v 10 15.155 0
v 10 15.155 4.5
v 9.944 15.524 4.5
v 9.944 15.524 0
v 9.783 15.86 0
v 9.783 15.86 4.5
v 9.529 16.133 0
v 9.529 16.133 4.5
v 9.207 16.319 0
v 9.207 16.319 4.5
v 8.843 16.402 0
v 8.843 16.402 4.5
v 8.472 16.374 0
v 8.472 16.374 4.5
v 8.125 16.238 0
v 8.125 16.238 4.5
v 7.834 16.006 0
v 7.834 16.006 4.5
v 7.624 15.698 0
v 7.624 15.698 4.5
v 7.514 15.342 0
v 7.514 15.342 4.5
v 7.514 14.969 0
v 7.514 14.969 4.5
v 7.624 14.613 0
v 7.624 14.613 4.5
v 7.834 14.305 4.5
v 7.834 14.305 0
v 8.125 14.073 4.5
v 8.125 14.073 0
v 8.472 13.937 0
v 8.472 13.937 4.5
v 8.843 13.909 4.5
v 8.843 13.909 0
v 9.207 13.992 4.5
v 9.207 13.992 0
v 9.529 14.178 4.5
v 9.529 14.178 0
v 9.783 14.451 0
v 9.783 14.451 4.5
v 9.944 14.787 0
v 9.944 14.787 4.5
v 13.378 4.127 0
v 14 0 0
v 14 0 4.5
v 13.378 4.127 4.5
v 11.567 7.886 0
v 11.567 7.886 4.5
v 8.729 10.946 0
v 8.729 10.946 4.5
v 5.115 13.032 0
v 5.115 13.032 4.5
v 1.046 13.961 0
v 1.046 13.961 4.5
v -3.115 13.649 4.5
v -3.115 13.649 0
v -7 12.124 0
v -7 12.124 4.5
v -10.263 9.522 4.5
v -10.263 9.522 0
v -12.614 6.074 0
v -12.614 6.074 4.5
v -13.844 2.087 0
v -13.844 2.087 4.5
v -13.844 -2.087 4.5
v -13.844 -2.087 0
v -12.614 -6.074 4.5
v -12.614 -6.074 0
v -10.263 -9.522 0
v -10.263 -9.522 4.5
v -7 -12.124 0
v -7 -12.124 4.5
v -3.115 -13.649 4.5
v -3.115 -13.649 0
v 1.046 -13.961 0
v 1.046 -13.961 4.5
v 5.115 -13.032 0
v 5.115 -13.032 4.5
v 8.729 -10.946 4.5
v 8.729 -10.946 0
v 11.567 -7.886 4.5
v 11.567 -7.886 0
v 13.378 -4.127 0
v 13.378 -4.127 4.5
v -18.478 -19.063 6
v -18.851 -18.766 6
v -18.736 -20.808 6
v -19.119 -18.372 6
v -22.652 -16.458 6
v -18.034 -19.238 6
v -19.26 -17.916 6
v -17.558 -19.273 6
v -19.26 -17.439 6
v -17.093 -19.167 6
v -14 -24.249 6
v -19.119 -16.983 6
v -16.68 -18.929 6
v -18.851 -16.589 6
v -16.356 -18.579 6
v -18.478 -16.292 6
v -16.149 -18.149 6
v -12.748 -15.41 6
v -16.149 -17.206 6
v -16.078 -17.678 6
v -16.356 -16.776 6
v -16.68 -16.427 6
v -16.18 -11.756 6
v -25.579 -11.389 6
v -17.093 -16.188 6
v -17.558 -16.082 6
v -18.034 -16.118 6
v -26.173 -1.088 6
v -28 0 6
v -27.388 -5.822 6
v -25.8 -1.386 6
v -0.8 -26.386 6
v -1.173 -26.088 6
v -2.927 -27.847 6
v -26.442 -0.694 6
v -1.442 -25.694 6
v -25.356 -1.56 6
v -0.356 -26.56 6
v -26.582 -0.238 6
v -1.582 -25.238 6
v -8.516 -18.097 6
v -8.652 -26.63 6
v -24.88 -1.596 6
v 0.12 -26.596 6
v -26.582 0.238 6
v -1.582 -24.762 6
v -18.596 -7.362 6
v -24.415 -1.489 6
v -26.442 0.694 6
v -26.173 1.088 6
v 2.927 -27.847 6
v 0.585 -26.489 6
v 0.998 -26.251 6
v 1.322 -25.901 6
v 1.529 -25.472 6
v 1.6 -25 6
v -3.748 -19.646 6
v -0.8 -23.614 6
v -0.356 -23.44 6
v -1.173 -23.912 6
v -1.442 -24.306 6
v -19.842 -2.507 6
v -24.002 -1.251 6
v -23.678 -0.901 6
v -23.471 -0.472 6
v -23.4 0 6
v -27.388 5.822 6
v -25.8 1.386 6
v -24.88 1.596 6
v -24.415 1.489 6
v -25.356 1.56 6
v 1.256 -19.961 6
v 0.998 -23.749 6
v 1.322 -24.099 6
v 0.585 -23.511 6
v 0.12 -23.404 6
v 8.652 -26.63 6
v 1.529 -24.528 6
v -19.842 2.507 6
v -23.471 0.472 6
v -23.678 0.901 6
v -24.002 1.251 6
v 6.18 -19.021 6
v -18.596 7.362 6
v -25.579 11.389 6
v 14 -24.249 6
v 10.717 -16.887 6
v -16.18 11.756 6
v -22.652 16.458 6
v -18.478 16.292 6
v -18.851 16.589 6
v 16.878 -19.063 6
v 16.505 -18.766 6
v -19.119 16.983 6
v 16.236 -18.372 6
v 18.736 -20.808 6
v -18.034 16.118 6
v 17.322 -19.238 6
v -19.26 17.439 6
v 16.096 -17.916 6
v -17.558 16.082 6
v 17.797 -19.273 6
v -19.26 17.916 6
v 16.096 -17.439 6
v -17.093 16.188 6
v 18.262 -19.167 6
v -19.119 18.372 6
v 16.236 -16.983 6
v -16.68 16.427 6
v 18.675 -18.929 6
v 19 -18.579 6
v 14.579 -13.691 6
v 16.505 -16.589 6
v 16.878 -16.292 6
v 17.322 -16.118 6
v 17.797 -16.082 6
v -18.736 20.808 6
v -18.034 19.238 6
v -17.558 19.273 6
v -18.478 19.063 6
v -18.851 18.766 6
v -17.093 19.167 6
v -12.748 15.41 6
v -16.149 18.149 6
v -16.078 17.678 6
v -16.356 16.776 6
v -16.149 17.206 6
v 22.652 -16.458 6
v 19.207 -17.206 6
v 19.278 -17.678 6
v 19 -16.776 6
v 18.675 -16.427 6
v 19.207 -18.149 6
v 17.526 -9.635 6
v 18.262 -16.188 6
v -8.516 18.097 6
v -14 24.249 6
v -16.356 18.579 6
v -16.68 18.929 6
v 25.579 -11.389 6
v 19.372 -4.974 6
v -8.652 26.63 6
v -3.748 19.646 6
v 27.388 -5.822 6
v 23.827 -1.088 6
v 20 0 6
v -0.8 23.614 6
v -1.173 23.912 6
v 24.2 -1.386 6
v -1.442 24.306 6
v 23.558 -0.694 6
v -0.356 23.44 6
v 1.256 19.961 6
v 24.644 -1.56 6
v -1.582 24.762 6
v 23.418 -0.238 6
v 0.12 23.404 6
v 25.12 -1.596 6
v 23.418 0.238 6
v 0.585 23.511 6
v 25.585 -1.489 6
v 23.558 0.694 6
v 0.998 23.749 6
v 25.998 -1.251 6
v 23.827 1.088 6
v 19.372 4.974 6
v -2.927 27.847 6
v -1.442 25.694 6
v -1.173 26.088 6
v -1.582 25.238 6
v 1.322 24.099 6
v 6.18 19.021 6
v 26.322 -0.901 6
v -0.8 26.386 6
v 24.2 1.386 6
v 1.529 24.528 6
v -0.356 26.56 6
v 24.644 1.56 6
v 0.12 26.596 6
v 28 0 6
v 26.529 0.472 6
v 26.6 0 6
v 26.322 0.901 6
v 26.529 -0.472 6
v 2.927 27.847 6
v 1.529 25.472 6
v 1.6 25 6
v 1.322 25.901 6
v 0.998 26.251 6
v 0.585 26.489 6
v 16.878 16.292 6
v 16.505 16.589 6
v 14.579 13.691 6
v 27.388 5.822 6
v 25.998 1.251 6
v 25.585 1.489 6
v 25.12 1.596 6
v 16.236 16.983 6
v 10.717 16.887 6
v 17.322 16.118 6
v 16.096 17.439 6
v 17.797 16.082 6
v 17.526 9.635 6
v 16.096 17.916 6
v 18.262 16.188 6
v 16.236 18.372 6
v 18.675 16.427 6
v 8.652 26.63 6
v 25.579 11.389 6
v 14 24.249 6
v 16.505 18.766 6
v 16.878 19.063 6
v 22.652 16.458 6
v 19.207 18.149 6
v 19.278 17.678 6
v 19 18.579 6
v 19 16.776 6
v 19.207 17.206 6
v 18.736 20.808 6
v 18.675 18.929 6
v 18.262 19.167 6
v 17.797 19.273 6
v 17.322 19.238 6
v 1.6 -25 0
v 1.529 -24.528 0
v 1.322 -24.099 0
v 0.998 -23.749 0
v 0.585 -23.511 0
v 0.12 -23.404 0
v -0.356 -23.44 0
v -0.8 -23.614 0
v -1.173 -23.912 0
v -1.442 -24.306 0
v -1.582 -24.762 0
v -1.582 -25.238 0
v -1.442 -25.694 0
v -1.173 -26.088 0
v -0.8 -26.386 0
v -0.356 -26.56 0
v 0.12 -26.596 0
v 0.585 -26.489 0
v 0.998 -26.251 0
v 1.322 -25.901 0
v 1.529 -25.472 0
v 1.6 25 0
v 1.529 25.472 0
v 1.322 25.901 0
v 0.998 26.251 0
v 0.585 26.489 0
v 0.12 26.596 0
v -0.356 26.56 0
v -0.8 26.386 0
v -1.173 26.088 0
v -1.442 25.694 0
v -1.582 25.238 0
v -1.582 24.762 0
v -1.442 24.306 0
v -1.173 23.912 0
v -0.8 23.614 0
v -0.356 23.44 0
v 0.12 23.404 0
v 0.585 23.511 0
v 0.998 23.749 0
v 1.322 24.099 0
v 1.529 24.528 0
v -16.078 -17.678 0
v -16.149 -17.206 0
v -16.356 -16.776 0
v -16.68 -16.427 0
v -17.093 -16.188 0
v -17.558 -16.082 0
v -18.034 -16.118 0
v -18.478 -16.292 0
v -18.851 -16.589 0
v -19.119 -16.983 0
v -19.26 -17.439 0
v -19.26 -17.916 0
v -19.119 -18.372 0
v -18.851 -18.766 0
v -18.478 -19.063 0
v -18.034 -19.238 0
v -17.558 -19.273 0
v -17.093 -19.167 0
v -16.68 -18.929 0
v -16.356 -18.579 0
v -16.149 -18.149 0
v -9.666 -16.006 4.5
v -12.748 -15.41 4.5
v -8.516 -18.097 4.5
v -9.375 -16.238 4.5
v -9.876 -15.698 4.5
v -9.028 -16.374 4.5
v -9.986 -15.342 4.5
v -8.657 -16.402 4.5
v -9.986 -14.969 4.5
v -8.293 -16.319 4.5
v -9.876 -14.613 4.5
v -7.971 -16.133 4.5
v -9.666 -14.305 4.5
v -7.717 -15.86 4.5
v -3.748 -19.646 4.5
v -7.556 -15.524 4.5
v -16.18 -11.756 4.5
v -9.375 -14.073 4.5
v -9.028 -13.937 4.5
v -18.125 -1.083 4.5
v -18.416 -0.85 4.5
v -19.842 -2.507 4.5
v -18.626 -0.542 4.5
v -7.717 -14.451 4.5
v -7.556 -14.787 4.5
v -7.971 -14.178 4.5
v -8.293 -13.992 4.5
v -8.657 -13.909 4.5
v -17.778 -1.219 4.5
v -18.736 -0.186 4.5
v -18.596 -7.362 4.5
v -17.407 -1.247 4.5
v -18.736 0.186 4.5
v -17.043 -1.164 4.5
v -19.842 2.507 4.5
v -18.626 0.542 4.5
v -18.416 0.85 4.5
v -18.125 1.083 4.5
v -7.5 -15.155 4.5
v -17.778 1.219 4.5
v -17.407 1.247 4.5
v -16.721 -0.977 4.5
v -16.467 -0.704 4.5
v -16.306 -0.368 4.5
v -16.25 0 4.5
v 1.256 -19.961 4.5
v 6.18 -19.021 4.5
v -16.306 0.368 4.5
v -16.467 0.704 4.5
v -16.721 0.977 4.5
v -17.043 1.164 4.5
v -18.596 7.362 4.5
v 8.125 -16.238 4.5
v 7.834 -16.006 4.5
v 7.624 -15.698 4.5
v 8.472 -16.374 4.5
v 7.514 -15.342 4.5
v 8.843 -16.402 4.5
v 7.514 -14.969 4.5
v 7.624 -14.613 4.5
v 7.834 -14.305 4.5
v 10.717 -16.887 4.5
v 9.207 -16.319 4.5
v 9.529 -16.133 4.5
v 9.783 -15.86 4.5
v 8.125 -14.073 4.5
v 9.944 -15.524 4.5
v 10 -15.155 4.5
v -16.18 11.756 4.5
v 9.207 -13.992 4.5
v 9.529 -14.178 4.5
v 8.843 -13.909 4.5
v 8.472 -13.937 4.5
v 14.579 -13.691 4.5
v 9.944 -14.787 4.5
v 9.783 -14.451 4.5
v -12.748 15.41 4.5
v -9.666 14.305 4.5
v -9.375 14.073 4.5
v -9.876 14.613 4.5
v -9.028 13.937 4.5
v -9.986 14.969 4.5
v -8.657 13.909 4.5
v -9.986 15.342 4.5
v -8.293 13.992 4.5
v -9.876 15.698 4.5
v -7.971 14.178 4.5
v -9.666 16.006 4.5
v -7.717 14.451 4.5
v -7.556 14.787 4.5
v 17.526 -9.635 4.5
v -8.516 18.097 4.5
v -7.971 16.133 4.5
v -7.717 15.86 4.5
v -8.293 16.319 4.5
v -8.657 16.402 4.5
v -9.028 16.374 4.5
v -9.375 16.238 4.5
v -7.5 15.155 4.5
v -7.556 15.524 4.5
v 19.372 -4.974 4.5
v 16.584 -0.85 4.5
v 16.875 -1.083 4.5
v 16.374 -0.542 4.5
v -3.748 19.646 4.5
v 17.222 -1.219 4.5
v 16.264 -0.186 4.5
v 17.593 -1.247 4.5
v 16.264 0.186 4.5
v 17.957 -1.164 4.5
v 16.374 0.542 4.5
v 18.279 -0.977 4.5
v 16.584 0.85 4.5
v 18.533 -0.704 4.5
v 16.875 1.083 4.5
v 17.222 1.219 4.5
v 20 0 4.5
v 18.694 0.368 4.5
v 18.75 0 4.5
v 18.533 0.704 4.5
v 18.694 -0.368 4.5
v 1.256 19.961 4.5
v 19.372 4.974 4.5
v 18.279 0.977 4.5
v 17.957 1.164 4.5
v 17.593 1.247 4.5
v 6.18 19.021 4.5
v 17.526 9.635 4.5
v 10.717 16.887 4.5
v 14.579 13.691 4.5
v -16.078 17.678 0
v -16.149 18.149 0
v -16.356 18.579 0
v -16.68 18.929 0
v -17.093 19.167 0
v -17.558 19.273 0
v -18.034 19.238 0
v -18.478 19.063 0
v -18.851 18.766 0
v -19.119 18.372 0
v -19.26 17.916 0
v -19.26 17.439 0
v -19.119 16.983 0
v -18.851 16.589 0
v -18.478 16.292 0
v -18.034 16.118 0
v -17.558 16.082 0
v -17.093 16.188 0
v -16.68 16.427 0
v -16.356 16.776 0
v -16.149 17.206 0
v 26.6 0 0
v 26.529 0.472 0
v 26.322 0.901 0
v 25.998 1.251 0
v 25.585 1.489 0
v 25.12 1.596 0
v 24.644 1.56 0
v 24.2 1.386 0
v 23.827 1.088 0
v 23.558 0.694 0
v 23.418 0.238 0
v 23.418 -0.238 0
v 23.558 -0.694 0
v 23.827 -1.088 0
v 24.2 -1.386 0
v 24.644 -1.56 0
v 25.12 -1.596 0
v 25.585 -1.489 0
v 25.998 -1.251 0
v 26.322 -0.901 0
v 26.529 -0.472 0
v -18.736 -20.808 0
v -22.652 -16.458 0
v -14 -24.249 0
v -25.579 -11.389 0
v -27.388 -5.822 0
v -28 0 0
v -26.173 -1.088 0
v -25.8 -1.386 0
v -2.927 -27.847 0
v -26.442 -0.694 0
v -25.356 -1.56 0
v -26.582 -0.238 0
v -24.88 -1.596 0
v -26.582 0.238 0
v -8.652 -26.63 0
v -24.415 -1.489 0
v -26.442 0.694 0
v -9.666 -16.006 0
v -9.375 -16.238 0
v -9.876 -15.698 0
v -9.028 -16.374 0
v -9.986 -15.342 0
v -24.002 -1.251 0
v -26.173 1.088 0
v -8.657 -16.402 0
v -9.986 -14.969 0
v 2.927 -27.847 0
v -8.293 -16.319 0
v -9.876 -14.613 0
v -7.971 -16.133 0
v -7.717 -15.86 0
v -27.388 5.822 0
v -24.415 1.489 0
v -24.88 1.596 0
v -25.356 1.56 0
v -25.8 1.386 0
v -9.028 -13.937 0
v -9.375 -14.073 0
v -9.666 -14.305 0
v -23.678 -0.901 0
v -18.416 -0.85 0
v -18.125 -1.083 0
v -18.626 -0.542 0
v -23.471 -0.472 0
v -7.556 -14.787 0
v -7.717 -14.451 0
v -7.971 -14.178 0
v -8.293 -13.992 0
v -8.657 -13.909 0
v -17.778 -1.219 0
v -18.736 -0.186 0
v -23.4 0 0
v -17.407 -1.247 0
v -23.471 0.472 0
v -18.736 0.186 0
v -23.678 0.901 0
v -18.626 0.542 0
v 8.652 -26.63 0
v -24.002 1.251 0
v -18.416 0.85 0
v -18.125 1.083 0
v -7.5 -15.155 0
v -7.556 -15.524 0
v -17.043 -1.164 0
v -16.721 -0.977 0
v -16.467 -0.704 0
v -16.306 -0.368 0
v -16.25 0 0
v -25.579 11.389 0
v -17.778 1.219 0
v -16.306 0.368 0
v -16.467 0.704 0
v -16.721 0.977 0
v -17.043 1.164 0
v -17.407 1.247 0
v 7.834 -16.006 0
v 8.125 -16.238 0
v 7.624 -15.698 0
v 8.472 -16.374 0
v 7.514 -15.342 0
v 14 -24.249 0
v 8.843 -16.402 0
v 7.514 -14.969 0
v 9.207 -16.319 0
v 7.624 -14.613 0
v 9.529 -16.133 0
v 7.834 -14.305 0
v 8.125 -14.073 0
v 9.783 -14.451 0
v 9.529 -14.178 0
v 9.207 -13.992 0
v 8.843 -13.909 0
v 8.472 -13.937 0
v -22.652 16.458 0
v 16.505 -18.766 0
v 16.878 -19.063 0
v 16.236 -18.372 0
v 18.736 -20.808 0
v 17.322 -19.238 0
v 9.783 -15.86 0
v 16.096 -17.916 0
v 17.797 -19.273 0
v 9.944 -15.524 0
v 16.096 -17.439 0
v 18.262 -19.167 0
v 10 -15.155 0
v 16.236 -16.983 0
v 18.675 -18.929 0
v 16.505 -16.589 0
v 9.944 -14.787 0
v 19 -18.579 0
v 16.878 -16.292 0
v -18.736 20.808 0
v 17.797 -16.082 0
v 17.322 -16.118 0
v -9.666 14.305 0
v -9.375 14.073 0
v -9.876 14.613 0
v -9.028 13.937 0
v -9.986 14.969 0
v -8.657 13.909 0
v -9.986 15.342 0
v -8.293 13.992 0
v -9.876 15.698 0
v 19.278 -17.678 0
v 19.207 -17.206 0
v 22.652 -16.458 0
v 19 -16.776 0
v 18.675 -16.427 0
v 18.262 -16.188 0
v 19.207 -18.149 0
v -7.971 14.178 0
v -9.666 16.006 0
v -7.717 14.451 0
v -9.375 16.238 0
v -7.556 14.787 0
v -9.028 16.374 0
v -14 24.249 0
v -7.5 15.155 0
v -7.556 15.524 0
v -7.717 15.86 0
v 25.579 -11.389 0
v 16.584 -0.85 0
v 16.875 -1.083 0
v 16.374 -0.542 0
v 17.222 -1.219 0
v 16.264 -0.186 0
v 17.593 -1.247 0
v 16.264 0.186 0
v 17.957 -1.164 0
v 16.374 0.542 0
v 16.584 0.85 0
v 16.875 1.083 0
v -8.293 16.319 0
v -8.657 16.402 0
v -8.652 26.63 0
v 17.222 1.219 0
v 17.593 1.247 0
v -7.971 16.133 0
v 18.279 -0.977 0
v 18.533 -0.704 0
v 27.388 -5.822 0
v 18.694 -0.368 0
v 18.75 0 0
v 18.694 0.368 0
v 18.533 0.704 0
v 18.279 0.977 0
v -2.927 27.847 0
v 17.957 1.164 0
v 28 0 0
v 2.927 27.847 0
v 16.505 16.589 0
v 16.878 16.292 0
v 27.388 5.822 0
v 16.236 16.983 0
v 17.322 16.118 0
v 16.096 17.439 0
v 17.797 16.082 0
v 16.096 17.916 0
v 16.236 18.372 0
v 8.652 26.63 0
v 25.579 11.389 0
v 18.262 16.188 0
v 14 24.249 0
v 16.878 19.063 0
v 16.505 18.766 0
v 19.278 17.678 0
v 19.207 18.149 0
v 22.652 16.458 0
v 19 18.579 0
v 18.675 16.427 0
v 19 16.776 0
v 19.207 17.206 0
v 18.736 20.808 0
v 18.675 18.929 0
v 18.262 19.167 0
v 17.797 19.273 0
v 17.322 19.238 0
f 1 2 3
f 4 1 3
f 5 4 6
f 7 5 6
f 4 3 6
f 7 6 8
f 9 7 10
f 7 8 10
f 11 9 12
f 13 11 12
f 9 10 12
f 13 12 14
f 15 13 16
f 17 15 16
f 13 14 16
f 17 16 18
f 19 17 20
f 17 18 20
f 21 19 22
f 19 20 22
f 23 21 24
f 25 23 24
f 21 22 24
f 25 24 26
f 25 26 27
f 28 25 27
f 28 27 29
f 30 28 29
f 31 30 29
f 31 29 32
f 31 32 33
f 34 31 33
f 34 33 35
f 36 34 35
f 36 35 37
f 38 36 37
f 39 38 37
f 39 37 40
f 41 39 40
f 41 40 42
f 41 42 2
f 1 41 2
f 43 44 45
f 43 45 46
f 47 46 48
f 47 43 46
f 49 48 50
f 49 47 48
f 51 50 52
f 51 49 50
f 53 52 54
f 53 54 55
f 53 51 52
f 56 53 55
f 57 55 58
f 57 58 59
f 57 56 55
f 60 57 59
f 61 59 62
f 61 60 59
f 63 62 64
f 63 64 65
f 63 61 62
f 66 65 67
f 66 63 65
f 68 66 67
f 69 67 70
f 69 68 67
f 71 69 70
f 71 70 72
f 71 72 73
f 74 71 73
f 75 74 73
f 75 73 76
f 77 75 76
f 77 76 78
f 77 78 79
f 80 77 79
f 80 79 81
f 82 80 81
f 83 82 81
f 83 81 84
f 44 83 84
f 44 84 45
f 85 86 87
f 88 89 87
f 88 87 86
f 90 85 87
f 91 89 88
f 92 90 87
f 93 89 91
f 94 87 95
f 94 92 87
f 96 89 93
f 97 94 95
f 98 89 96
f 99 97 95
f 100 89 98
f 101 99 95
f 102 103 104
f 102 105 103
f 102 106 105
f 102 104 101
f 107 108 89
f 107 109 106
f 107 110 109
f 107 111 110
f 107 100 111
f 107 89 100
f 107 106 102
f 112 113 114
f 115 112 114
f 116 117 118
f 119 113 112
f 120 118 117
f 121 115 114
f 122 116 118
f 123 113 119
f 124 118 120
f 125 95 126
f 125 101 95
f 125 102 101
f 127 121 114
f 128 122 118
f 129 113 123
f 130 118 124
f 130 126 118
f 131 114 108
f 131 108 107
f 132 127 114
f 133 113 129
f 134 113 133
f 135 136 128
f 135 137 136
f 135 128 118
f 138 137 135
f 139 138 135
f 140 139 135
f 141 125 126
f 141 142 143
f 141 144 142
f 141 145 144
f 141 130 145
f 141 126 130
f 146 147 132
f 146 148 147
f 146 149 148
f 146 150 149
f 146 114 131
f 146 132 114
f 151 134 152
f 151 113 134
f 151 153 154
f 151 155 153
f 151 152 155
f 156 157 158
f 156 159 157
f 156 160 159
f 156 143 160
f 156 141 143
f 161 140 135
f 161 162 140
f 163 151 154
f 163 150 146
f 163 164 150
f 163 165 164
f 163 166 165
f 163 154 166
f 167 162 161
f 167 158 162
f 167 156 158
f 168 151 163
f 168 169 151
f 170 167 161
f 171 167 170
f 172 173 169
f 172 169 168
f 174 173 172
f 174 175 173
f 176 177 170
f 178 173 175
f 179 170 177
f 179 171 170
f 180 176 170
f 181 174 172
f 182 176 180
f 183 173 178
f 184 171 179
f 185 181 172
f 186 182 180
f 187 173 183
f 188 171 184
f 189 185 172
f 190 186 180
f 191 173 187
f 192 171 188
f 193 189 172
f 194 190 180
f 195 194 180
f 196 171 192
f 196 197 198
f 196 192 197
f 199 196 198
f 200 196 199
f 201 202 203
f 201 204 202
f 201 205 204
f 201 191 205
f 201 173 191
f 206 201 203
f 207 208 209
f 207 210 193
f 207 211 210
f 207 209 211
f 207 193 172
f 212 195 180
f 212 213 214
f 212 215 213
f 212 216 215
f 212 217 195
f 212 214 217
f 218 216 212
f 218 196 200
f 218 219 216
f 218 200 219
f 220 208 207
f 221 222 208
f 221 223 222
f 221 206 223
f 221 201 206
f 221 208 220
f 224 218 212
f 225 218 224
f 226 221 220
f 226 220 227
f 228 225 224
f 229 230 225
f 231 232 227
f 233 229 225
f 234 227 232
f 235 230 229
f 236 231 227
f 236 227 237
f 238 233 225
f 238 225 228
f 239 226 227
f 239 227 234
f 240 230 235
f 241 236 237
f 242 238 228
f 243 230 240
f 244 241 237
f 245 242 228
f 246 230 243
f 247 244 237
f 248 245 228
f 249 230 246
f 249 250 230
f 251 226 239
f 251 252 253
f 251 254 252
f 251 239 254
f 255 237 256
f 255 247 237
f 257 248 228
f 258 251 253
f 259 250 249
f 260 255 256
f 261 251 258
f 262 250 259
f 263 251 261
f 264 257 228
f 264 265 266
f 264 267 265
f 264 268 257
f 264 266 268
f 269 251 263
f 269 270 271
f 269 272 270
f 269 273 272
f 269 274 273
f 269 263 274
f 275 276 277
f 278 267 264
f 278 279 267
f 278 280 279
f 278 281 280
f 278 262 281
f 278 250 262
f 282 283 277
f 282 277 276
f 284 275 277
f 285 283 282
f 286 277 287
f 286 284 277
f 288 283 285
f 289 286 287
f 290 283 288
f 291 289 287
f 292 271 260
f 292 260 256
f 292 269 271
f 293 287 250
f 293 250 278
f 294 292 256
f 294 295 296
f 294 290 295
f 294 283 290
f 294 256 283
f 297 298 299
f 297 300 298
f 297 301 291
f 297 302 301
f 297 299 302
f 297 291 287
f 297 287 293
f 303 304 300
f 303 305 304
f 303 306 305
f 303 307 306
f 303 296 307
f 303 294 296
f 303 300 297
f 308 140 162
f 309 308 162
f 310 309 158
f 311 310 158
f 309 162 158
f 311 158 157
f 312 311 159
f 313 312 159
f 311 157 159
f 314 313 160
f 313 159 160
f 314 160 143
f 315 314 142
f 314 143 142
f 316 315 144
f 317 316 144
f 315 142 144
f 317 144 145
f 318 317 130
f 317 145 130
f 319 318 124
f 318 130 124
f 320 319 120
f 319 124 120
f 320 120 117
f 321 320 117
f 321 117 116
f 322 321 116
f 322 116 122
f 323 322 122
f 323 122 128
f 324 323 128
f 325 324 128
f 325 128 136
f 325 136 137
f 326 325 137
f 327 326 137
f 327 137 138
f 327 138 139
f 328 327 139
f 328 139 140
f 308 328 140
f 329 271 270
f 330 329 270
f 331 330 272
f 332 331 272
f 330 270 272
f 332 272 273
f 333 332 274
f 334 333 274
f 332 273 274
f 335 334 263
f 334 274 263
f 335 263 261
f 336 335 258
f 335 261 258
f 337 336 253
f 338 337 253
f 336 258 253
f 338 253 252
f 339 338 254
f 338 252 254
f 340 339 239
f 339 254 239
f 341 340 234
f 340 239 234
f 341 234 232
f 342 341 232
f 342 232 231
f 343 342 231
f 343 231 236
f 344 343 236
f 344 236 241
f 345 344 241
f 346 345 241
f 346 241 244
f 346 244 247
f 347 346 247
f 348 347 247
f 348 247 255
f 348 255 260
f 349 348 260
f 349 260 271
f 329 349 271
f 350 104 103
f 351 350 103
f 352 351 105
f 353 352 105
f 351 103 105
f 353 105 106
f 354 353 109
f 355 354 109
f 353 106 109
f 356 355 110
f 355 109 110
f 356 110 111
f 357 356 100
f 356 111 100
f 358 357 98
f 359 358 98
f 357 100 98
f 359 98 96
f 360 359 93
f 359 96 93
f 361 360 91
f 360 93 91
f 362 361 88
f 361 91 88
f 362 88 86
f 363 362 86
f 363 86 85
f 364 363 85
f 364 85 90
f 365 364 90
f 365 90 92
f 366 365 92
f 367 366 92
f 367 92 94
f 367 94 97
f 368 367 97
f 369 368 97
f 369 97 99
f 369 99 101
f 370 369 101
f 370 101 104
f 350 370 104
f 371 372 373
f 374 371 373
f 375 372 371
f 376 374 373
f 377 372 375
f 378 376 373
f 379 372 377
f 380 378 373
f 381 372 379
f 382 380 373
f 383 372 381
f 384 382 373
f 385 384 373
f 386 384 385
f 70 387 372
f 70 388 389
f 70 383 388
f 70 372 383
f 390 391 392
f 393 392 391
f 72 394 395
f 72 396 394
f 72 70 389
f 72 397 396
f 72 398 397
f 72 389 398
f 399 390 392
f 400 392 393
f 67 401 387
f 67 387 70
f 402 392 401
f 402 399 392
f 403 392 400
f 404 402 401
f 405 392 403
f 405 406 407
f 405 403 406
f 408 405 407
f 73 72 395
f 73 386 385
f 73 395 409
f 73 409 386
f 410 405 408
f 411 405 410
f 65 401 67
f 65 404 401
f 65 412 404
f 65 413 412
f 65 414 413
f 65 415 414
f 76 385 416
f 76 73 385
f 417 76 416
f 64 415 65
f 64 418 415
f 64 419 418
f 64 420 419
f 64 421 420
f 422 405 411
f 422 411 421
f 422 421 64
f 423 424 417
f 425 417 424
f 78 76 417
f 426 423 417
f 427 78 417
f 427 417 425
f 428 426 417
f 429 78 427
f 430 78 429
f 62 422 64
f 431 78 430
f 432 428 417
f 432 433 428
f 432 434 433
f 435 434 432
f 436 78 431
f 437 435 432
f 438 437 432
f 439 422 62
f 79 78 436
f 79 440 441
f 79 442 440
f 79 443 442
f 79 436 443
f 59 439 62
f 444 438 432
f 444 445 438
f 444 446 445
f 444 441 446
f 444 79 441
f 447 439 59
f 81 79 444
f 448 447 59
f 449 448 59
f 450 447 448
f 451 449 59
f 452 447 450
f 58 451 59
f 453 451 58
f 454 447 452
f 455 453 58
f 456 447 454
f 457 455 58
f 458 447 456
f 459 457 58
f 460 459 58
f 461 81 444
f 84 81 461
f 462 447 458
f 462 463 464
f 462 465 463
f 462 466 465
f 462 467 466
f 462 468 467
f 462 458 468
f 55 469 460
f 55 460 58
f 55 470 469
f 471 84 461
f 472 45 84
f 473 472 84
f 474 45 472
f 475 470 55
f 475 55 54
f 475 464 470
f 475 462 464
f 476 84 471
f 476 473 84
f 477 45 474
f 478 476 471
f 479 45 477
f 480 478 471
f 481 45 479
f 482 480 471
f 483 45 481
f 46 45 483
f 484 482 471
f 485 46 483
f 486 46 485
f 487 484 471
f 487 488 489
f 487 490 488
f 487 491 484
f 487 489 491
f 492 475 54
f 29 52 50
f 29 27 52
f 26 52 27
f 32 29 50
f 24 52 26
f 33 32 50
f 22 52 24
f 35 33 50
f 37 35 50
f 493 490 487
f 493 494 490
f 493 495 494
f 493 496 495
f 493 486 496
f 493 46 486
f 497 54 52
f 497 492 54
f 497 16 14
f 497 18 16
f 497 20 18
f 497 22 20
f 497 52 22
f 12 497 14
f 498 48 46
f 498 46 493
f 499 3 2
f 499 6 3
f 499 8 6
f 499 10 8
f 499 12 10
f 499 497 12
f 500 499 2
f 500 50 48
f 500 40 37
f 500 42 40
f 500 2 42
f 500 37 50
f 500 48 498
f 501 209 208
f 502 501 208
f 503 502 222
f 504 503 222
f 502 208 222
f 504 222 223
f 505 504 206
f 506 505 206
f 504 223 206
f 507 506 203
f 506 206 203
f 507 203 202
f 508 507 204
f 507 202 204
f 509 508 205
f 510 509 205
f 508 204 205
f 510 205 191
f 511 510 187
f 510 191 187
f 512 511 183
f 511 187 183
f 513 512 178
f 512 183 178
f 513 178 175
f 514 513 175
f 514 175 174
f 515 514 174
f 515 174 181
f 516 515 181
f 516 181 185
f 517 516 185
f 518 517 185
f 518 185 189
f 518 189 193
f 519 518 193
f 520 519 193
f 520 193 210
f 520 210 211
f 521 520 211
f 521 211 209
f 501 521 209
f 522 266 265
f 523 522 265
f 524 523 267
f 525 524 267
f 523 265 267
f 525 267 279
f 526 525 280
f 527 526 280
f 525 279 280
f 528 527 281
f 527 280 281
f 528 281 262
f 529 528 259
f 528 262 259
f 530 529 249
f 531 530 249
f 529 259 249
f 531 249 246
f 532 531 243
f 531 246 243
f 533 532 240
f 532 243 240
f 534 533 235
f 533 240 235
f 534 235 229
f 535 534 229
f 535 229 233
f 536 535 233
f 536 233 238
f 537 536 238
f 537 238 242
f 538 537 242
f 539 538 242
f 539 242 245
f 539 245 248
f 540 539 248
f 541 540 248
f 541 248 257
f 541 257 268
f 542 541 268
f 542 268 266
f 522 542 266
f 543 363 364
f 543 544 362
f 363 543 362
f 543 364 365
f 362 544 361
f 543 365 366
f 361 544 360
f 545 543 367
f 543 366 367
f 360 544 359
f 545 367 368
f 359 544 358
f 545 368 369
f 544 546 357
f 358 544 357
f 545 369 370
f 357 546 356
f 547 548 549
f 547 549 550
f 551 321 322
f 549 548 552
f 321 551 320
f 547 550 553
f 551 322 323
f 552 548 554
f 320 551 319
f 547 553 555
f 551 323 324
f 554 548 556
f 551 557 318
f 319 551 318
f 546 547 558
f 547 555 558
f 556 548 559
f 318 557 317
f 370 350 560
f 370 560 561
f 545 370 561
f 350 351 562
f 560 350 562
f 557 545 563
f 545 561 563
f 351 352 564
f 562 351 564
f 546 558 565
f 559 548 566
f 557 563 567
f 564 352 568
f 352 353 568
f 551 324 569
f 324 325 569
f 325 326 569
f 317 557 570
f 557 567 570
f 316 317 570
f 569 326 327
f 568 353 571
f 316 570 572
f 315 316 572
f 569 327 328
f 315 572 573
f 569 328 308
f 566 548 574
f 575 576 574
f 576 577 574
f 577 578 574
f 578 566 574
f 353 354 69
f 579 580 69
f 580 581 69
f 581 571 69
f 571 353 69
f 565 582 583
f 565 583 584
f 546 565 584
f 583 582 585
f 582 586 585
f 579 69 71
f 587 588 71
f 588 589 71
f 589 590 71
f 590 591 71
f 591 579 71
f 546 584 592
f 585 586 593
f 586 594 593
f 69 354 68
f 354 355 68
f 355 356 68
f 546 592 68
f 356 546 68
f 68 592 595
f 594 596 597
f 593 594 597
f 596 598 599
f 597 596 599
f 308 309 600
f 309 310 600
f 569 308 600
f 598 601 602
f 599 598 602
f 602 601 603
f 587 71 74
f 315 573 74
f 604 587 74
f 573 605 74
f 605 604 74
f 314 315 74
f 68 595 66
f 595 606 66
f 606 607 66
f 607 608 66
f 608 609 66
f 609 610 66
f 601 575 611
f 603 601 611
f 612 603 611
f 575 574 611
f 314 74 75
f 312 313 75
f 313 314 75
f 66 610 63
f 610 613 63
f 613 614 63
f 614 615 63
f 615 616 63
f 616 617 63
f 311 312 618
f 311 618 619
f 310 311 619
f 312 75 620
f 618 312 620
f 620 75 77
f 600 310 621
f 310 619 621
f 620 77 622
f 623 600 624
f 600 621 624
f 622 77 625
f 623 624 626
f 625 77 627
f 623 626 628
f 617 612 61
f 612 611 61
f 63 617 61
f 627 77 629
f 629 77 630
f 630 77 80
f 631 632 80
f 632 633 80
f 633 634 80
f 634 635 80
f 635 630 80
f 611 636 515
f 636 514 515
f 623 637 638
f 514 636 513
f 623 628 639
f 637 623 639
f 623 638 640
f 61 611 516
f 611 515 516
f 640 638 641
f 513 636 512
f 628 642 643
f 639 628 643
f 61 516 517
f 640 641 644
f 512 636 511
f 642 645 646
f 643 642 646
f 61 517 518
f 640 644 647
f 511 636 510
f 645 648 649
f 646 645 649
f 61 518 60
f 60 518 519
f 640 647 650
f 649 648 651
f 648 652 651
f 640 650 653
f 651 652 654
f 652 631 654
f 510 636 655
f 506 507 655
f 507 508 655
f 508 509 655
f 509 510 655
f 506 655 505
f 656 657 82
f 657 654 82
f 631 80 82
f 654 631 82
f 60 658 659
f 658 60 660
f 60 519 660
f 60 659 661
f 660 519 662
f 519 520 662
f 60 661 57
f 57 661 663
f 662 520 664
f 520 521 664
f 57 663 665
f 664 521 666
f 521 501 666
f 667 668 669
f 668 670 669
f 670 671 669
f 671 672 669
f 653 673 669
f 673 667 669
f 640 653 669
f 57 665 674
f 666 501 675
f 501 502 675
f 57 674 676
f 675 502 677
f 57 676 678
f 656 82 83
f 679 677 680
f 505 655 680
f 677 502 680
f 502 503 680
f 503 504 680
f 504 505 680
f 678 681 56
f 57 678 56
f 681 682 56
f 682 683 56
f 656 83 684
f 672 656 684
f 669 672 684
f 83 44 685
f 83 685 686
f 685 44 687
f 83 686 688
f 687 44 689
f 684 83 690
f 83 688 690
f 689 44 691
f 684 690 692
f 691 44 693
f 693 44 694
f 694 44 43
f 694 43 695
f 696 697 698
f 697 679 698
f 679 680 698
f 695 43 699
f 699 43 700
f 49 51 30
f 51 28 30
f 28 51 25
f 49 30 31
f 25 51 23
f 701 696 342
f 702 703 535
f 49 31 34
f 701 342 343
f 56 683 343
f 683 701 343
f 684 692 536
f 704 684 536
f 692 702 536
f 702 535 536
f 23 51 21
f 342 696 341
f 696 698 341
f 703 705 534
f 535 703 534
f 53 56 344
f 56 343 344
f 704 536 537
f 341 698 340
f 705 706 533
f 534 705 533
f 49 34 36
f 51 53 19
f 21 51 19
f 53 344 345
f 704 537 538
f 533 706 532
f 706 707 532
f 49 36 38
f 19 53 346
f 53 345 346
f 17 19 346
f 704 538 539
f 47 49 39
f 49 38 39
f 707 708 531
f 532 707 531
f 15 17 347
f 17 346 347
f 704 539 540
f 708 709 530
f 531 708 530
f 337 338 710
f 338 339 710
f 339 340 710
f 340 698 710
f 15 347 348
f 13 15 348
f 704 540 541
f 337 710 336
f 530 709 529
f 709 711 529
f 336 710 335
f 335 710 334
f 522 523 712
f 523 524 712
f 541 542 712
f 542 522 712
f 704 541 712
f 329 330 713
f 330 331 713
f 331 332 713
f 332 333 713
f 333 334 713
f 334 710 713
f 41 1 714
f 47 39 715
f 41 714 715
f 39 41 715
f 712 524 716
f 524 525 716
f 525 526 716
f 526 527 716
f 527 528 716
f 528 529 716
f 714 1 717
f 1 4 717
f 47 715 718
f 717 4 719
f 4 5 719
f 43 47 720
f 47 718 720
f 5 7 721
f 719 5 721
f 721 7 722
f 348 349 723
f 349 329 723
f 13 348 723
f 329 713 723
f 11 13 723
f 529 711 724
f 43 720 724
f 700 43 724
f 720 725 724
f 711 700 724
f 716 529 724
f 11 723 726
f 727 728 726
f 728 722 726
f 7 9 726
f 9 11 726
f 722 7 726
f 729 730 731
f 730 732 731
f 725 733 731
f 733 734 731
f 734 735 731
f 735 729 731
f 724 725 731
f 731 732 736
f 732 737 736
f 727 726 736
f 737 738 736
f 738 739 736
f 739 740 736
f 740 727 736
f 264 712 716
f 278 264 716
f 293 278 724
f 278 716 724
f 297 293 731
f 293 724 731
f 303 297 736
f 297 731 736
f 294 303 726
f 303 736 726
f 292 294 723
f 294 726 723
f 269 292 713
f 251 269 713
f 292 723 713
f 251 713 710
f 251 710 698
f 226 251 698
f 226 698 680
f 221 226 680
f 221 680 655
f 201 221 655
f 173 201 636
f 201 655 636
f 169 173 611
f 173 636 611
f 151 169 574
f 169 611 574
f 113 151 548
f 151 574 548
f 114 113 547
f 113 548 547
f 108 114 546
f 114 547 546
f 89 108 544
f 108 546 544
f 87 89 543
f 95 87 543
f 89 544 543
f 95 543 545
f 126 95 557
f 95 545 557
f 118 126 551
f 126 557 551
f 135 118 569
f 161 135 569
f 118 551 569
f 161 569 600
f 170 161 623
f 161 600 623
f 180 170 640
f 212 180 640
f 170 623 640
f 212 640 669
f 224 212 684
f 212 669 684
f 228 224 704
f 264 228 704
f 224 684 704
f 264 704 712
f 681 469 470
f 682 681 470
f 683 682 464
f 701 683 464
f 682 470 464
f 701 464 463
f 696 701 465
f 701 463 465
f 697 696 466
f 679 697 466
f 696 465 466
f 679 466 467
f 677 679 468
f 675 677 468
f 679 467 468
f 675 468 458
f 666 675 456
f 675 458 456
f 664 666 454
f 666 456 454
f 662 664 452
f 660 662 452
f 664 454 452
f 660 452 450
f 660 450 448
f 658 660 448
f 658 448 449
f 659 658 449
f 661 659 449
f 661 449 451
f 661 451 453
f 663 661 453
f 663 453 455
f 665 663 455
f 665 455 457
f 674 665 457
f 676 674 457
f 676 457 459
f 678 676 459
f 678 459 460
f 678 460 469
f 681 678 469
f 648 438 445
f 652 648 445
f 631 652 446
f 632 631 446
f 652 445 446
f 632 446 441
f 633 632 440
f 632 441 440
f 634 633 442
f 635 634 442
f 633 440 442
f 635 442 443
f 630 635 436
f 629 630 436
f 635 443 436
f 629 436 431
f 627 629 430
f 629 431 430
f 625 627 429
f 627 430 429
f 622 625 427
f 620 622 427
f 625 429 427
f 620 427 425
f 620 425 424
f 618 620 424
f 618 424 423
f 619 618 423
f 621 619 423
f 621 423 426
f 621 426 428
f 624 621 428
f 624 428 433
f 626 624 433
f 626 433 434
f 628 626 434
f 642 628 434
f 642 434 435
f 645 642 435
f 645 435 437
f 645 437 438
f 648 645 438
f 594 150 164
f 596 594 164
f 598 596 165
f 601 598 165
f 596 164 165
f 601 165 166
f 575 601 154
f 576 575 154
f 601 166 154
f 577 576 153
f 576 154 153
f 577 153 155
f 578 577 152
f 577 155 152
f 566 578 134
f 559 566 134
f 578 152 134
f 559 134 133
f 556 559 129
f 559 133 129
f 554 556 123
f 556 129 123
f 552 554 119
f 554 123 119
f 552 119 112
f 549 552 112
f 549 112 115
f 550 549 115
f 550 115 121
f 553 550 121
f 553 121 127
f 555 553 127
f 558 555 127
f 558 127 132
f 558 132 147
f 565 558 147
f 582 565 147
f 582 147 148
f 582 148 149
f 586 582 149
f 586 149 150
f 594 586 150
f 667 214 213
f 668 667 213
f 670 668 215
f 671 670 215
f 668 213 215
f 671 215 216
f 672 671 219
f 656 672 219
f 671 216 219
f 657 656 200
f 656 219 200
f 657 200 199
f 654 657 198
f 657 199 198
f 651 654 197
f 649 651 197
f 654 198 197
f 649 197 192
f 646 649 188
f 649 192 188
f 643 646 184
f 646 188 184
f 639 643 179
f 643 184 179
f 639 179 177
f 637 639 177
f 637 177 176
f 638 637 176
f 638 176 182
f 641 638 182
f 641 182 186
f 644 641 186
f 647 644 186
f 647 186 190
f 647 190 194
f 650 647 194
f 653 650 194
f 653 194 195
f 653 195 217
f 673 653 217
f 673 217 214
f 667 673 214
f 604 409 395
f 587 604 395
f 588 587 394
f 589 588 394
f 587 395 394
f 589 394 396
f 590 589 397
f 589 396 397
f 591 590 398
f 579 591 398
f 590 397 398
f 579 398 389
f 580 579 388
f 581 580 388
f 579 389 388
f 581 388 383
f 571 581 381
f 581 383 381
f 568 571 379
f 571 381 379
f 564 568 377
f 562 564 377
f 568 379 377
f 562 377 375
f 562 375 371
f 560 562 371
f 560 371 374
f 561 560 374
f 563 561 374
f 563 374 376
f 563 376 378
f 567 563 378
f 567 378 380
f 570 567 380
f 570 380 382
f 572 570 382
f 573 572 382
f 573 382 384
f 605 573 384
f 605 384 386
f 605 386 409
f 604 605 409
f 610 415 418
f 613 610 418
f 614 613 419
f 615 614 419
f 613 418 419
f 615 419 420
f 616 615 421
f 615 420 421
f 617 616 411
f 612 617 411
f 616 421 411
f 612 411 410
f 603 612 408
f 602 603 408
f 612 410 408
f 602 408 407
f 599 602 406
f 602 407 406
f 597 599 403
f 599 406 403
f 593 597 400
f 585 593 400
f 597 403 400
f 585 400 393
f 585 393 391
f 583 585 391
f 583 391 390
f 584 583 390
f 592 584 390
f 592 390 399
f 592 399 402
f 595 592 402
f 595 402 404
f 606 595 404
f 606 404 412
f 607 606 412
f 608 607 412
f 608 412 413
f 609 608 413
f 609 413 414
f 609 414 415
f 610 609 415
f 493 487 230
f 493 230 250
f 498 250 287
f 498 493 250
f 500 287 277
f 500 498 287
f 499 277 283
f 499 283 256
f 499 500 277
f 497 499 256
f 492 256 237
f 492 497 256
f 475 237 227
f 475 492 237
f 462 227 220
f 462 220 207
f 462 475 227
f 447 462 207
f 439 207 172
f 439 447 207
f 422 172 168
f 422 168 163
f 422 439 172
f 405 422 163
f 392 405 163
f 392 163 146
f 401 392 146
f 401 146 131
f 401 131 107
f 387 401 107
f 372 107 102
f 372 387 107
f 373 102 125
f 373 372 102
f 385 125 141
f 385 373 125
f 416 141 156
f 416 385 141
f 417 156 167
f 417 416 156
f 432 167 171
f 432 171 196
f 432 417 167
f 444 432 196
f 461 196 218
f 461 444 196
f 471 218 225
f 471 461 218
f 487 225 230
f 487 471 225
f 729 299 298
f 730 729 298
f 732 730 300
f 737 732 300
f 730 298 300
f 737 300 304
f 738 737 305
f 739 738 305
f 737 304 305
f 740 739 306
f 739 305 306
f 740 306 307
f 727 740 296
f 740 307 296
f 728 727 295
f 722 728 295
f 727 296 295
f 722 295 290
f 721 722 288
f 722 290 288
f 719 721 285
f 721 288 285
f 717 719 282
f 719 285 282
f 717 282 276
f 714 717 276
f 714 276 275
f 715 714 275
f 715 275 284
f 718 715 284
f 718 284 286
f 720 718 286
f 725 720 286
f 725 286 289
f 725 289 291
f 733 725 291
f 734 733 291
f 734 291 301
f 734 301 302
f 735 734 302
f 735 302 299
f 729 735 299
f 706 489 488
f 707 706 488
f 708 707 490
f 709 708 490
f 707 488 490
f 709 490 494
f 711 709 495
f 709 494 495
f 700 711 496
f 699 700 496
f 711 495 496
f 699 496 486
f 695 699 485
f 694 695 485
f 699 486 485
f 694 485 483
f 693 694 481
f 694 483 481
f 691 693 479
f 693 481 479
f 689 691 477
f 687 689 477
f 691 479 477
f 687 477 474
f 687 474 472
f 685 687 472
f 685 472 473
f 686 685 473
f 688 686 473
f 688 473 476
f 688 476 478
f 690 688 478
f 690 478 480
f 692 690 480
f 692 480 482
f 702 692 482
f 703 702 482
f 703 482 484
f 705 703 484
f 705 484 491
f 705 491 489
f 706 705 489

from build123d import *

# Parameters (mm, degrees)
SKETCH_1_R          = 28
SKETCH_1_R_2        = 14
EXTRUDE_1_DEPTH     = 6
CUT_EXTRUDE_START   = 4.5
SKETCH_1_4_R        = 20
SKETCH_1_4_R_2      = 14
CUT_EXTRUDE_1_DEPTH = 1.5
M3X0_5_1_D          = 2.5
HOLE_WIZARD_M3_1_D  = 3.2


with BuildPart() as part:
    # ｽｹｯﾁ1 → ﾎﾞｽ - 押し出し1 (new body)
    with BuildSketch(Plane.XY):
        Circle(SKETCH_1_R)
        Circle(SKETCH_1_R_2, mode=Mode.SUBTRACT)
    extrude(amount=EXTRUDE_1_DEPTH)

    # ｽｹｯﾁ1<4> → ｶｯﾄ - 押し出し1 (cut)
    with BuildSketch(Plane.XY.offset(CUT_EXTRUDE_START)):
        Circle(SKETCH_1_4_R)
        Circle(SKETCH_1_4_R_2, mode=Mode.SUBTRACT)
    extrude(amount=CUT_EXTRUDE_1_DEPTH, mode=Mode.SUBTRACT)

    # M3x0.5 ねじ穴用ねじ下穴ﾄﾞﾘﾙ1 (through all)
    with Locations(Plane(origin=(17.5, 0, 0), x_dir=(-1, 0, 0), z_dir=(0, 0, -1))):
        with Locations((0, 0), (8.75, -15.155444566), (26.25, -15.155444566), (35, 0), (26.25, 15.155444566), (8.75, 15.155444566)):
            Hole(M3X0_5_1_D / 2)

    # M3 すきま穴1 (through all)
    with Locations(Plane(origin=(0, 25, 0), x_dir=(-1, 0, 0), z_dir=(0, 0, -1))):
        with Locations((0, 0), (-17.67766953, -7.32233047), (-25, -25), (-17.67766953, -42.67766953), (0, -50), (17.67766953, -42.67766953), (25, -25), (17.67766953, -7.32233047)):
            Hole(HOLE_WIZARD_M3_1_D / 2)


solid = part.part
